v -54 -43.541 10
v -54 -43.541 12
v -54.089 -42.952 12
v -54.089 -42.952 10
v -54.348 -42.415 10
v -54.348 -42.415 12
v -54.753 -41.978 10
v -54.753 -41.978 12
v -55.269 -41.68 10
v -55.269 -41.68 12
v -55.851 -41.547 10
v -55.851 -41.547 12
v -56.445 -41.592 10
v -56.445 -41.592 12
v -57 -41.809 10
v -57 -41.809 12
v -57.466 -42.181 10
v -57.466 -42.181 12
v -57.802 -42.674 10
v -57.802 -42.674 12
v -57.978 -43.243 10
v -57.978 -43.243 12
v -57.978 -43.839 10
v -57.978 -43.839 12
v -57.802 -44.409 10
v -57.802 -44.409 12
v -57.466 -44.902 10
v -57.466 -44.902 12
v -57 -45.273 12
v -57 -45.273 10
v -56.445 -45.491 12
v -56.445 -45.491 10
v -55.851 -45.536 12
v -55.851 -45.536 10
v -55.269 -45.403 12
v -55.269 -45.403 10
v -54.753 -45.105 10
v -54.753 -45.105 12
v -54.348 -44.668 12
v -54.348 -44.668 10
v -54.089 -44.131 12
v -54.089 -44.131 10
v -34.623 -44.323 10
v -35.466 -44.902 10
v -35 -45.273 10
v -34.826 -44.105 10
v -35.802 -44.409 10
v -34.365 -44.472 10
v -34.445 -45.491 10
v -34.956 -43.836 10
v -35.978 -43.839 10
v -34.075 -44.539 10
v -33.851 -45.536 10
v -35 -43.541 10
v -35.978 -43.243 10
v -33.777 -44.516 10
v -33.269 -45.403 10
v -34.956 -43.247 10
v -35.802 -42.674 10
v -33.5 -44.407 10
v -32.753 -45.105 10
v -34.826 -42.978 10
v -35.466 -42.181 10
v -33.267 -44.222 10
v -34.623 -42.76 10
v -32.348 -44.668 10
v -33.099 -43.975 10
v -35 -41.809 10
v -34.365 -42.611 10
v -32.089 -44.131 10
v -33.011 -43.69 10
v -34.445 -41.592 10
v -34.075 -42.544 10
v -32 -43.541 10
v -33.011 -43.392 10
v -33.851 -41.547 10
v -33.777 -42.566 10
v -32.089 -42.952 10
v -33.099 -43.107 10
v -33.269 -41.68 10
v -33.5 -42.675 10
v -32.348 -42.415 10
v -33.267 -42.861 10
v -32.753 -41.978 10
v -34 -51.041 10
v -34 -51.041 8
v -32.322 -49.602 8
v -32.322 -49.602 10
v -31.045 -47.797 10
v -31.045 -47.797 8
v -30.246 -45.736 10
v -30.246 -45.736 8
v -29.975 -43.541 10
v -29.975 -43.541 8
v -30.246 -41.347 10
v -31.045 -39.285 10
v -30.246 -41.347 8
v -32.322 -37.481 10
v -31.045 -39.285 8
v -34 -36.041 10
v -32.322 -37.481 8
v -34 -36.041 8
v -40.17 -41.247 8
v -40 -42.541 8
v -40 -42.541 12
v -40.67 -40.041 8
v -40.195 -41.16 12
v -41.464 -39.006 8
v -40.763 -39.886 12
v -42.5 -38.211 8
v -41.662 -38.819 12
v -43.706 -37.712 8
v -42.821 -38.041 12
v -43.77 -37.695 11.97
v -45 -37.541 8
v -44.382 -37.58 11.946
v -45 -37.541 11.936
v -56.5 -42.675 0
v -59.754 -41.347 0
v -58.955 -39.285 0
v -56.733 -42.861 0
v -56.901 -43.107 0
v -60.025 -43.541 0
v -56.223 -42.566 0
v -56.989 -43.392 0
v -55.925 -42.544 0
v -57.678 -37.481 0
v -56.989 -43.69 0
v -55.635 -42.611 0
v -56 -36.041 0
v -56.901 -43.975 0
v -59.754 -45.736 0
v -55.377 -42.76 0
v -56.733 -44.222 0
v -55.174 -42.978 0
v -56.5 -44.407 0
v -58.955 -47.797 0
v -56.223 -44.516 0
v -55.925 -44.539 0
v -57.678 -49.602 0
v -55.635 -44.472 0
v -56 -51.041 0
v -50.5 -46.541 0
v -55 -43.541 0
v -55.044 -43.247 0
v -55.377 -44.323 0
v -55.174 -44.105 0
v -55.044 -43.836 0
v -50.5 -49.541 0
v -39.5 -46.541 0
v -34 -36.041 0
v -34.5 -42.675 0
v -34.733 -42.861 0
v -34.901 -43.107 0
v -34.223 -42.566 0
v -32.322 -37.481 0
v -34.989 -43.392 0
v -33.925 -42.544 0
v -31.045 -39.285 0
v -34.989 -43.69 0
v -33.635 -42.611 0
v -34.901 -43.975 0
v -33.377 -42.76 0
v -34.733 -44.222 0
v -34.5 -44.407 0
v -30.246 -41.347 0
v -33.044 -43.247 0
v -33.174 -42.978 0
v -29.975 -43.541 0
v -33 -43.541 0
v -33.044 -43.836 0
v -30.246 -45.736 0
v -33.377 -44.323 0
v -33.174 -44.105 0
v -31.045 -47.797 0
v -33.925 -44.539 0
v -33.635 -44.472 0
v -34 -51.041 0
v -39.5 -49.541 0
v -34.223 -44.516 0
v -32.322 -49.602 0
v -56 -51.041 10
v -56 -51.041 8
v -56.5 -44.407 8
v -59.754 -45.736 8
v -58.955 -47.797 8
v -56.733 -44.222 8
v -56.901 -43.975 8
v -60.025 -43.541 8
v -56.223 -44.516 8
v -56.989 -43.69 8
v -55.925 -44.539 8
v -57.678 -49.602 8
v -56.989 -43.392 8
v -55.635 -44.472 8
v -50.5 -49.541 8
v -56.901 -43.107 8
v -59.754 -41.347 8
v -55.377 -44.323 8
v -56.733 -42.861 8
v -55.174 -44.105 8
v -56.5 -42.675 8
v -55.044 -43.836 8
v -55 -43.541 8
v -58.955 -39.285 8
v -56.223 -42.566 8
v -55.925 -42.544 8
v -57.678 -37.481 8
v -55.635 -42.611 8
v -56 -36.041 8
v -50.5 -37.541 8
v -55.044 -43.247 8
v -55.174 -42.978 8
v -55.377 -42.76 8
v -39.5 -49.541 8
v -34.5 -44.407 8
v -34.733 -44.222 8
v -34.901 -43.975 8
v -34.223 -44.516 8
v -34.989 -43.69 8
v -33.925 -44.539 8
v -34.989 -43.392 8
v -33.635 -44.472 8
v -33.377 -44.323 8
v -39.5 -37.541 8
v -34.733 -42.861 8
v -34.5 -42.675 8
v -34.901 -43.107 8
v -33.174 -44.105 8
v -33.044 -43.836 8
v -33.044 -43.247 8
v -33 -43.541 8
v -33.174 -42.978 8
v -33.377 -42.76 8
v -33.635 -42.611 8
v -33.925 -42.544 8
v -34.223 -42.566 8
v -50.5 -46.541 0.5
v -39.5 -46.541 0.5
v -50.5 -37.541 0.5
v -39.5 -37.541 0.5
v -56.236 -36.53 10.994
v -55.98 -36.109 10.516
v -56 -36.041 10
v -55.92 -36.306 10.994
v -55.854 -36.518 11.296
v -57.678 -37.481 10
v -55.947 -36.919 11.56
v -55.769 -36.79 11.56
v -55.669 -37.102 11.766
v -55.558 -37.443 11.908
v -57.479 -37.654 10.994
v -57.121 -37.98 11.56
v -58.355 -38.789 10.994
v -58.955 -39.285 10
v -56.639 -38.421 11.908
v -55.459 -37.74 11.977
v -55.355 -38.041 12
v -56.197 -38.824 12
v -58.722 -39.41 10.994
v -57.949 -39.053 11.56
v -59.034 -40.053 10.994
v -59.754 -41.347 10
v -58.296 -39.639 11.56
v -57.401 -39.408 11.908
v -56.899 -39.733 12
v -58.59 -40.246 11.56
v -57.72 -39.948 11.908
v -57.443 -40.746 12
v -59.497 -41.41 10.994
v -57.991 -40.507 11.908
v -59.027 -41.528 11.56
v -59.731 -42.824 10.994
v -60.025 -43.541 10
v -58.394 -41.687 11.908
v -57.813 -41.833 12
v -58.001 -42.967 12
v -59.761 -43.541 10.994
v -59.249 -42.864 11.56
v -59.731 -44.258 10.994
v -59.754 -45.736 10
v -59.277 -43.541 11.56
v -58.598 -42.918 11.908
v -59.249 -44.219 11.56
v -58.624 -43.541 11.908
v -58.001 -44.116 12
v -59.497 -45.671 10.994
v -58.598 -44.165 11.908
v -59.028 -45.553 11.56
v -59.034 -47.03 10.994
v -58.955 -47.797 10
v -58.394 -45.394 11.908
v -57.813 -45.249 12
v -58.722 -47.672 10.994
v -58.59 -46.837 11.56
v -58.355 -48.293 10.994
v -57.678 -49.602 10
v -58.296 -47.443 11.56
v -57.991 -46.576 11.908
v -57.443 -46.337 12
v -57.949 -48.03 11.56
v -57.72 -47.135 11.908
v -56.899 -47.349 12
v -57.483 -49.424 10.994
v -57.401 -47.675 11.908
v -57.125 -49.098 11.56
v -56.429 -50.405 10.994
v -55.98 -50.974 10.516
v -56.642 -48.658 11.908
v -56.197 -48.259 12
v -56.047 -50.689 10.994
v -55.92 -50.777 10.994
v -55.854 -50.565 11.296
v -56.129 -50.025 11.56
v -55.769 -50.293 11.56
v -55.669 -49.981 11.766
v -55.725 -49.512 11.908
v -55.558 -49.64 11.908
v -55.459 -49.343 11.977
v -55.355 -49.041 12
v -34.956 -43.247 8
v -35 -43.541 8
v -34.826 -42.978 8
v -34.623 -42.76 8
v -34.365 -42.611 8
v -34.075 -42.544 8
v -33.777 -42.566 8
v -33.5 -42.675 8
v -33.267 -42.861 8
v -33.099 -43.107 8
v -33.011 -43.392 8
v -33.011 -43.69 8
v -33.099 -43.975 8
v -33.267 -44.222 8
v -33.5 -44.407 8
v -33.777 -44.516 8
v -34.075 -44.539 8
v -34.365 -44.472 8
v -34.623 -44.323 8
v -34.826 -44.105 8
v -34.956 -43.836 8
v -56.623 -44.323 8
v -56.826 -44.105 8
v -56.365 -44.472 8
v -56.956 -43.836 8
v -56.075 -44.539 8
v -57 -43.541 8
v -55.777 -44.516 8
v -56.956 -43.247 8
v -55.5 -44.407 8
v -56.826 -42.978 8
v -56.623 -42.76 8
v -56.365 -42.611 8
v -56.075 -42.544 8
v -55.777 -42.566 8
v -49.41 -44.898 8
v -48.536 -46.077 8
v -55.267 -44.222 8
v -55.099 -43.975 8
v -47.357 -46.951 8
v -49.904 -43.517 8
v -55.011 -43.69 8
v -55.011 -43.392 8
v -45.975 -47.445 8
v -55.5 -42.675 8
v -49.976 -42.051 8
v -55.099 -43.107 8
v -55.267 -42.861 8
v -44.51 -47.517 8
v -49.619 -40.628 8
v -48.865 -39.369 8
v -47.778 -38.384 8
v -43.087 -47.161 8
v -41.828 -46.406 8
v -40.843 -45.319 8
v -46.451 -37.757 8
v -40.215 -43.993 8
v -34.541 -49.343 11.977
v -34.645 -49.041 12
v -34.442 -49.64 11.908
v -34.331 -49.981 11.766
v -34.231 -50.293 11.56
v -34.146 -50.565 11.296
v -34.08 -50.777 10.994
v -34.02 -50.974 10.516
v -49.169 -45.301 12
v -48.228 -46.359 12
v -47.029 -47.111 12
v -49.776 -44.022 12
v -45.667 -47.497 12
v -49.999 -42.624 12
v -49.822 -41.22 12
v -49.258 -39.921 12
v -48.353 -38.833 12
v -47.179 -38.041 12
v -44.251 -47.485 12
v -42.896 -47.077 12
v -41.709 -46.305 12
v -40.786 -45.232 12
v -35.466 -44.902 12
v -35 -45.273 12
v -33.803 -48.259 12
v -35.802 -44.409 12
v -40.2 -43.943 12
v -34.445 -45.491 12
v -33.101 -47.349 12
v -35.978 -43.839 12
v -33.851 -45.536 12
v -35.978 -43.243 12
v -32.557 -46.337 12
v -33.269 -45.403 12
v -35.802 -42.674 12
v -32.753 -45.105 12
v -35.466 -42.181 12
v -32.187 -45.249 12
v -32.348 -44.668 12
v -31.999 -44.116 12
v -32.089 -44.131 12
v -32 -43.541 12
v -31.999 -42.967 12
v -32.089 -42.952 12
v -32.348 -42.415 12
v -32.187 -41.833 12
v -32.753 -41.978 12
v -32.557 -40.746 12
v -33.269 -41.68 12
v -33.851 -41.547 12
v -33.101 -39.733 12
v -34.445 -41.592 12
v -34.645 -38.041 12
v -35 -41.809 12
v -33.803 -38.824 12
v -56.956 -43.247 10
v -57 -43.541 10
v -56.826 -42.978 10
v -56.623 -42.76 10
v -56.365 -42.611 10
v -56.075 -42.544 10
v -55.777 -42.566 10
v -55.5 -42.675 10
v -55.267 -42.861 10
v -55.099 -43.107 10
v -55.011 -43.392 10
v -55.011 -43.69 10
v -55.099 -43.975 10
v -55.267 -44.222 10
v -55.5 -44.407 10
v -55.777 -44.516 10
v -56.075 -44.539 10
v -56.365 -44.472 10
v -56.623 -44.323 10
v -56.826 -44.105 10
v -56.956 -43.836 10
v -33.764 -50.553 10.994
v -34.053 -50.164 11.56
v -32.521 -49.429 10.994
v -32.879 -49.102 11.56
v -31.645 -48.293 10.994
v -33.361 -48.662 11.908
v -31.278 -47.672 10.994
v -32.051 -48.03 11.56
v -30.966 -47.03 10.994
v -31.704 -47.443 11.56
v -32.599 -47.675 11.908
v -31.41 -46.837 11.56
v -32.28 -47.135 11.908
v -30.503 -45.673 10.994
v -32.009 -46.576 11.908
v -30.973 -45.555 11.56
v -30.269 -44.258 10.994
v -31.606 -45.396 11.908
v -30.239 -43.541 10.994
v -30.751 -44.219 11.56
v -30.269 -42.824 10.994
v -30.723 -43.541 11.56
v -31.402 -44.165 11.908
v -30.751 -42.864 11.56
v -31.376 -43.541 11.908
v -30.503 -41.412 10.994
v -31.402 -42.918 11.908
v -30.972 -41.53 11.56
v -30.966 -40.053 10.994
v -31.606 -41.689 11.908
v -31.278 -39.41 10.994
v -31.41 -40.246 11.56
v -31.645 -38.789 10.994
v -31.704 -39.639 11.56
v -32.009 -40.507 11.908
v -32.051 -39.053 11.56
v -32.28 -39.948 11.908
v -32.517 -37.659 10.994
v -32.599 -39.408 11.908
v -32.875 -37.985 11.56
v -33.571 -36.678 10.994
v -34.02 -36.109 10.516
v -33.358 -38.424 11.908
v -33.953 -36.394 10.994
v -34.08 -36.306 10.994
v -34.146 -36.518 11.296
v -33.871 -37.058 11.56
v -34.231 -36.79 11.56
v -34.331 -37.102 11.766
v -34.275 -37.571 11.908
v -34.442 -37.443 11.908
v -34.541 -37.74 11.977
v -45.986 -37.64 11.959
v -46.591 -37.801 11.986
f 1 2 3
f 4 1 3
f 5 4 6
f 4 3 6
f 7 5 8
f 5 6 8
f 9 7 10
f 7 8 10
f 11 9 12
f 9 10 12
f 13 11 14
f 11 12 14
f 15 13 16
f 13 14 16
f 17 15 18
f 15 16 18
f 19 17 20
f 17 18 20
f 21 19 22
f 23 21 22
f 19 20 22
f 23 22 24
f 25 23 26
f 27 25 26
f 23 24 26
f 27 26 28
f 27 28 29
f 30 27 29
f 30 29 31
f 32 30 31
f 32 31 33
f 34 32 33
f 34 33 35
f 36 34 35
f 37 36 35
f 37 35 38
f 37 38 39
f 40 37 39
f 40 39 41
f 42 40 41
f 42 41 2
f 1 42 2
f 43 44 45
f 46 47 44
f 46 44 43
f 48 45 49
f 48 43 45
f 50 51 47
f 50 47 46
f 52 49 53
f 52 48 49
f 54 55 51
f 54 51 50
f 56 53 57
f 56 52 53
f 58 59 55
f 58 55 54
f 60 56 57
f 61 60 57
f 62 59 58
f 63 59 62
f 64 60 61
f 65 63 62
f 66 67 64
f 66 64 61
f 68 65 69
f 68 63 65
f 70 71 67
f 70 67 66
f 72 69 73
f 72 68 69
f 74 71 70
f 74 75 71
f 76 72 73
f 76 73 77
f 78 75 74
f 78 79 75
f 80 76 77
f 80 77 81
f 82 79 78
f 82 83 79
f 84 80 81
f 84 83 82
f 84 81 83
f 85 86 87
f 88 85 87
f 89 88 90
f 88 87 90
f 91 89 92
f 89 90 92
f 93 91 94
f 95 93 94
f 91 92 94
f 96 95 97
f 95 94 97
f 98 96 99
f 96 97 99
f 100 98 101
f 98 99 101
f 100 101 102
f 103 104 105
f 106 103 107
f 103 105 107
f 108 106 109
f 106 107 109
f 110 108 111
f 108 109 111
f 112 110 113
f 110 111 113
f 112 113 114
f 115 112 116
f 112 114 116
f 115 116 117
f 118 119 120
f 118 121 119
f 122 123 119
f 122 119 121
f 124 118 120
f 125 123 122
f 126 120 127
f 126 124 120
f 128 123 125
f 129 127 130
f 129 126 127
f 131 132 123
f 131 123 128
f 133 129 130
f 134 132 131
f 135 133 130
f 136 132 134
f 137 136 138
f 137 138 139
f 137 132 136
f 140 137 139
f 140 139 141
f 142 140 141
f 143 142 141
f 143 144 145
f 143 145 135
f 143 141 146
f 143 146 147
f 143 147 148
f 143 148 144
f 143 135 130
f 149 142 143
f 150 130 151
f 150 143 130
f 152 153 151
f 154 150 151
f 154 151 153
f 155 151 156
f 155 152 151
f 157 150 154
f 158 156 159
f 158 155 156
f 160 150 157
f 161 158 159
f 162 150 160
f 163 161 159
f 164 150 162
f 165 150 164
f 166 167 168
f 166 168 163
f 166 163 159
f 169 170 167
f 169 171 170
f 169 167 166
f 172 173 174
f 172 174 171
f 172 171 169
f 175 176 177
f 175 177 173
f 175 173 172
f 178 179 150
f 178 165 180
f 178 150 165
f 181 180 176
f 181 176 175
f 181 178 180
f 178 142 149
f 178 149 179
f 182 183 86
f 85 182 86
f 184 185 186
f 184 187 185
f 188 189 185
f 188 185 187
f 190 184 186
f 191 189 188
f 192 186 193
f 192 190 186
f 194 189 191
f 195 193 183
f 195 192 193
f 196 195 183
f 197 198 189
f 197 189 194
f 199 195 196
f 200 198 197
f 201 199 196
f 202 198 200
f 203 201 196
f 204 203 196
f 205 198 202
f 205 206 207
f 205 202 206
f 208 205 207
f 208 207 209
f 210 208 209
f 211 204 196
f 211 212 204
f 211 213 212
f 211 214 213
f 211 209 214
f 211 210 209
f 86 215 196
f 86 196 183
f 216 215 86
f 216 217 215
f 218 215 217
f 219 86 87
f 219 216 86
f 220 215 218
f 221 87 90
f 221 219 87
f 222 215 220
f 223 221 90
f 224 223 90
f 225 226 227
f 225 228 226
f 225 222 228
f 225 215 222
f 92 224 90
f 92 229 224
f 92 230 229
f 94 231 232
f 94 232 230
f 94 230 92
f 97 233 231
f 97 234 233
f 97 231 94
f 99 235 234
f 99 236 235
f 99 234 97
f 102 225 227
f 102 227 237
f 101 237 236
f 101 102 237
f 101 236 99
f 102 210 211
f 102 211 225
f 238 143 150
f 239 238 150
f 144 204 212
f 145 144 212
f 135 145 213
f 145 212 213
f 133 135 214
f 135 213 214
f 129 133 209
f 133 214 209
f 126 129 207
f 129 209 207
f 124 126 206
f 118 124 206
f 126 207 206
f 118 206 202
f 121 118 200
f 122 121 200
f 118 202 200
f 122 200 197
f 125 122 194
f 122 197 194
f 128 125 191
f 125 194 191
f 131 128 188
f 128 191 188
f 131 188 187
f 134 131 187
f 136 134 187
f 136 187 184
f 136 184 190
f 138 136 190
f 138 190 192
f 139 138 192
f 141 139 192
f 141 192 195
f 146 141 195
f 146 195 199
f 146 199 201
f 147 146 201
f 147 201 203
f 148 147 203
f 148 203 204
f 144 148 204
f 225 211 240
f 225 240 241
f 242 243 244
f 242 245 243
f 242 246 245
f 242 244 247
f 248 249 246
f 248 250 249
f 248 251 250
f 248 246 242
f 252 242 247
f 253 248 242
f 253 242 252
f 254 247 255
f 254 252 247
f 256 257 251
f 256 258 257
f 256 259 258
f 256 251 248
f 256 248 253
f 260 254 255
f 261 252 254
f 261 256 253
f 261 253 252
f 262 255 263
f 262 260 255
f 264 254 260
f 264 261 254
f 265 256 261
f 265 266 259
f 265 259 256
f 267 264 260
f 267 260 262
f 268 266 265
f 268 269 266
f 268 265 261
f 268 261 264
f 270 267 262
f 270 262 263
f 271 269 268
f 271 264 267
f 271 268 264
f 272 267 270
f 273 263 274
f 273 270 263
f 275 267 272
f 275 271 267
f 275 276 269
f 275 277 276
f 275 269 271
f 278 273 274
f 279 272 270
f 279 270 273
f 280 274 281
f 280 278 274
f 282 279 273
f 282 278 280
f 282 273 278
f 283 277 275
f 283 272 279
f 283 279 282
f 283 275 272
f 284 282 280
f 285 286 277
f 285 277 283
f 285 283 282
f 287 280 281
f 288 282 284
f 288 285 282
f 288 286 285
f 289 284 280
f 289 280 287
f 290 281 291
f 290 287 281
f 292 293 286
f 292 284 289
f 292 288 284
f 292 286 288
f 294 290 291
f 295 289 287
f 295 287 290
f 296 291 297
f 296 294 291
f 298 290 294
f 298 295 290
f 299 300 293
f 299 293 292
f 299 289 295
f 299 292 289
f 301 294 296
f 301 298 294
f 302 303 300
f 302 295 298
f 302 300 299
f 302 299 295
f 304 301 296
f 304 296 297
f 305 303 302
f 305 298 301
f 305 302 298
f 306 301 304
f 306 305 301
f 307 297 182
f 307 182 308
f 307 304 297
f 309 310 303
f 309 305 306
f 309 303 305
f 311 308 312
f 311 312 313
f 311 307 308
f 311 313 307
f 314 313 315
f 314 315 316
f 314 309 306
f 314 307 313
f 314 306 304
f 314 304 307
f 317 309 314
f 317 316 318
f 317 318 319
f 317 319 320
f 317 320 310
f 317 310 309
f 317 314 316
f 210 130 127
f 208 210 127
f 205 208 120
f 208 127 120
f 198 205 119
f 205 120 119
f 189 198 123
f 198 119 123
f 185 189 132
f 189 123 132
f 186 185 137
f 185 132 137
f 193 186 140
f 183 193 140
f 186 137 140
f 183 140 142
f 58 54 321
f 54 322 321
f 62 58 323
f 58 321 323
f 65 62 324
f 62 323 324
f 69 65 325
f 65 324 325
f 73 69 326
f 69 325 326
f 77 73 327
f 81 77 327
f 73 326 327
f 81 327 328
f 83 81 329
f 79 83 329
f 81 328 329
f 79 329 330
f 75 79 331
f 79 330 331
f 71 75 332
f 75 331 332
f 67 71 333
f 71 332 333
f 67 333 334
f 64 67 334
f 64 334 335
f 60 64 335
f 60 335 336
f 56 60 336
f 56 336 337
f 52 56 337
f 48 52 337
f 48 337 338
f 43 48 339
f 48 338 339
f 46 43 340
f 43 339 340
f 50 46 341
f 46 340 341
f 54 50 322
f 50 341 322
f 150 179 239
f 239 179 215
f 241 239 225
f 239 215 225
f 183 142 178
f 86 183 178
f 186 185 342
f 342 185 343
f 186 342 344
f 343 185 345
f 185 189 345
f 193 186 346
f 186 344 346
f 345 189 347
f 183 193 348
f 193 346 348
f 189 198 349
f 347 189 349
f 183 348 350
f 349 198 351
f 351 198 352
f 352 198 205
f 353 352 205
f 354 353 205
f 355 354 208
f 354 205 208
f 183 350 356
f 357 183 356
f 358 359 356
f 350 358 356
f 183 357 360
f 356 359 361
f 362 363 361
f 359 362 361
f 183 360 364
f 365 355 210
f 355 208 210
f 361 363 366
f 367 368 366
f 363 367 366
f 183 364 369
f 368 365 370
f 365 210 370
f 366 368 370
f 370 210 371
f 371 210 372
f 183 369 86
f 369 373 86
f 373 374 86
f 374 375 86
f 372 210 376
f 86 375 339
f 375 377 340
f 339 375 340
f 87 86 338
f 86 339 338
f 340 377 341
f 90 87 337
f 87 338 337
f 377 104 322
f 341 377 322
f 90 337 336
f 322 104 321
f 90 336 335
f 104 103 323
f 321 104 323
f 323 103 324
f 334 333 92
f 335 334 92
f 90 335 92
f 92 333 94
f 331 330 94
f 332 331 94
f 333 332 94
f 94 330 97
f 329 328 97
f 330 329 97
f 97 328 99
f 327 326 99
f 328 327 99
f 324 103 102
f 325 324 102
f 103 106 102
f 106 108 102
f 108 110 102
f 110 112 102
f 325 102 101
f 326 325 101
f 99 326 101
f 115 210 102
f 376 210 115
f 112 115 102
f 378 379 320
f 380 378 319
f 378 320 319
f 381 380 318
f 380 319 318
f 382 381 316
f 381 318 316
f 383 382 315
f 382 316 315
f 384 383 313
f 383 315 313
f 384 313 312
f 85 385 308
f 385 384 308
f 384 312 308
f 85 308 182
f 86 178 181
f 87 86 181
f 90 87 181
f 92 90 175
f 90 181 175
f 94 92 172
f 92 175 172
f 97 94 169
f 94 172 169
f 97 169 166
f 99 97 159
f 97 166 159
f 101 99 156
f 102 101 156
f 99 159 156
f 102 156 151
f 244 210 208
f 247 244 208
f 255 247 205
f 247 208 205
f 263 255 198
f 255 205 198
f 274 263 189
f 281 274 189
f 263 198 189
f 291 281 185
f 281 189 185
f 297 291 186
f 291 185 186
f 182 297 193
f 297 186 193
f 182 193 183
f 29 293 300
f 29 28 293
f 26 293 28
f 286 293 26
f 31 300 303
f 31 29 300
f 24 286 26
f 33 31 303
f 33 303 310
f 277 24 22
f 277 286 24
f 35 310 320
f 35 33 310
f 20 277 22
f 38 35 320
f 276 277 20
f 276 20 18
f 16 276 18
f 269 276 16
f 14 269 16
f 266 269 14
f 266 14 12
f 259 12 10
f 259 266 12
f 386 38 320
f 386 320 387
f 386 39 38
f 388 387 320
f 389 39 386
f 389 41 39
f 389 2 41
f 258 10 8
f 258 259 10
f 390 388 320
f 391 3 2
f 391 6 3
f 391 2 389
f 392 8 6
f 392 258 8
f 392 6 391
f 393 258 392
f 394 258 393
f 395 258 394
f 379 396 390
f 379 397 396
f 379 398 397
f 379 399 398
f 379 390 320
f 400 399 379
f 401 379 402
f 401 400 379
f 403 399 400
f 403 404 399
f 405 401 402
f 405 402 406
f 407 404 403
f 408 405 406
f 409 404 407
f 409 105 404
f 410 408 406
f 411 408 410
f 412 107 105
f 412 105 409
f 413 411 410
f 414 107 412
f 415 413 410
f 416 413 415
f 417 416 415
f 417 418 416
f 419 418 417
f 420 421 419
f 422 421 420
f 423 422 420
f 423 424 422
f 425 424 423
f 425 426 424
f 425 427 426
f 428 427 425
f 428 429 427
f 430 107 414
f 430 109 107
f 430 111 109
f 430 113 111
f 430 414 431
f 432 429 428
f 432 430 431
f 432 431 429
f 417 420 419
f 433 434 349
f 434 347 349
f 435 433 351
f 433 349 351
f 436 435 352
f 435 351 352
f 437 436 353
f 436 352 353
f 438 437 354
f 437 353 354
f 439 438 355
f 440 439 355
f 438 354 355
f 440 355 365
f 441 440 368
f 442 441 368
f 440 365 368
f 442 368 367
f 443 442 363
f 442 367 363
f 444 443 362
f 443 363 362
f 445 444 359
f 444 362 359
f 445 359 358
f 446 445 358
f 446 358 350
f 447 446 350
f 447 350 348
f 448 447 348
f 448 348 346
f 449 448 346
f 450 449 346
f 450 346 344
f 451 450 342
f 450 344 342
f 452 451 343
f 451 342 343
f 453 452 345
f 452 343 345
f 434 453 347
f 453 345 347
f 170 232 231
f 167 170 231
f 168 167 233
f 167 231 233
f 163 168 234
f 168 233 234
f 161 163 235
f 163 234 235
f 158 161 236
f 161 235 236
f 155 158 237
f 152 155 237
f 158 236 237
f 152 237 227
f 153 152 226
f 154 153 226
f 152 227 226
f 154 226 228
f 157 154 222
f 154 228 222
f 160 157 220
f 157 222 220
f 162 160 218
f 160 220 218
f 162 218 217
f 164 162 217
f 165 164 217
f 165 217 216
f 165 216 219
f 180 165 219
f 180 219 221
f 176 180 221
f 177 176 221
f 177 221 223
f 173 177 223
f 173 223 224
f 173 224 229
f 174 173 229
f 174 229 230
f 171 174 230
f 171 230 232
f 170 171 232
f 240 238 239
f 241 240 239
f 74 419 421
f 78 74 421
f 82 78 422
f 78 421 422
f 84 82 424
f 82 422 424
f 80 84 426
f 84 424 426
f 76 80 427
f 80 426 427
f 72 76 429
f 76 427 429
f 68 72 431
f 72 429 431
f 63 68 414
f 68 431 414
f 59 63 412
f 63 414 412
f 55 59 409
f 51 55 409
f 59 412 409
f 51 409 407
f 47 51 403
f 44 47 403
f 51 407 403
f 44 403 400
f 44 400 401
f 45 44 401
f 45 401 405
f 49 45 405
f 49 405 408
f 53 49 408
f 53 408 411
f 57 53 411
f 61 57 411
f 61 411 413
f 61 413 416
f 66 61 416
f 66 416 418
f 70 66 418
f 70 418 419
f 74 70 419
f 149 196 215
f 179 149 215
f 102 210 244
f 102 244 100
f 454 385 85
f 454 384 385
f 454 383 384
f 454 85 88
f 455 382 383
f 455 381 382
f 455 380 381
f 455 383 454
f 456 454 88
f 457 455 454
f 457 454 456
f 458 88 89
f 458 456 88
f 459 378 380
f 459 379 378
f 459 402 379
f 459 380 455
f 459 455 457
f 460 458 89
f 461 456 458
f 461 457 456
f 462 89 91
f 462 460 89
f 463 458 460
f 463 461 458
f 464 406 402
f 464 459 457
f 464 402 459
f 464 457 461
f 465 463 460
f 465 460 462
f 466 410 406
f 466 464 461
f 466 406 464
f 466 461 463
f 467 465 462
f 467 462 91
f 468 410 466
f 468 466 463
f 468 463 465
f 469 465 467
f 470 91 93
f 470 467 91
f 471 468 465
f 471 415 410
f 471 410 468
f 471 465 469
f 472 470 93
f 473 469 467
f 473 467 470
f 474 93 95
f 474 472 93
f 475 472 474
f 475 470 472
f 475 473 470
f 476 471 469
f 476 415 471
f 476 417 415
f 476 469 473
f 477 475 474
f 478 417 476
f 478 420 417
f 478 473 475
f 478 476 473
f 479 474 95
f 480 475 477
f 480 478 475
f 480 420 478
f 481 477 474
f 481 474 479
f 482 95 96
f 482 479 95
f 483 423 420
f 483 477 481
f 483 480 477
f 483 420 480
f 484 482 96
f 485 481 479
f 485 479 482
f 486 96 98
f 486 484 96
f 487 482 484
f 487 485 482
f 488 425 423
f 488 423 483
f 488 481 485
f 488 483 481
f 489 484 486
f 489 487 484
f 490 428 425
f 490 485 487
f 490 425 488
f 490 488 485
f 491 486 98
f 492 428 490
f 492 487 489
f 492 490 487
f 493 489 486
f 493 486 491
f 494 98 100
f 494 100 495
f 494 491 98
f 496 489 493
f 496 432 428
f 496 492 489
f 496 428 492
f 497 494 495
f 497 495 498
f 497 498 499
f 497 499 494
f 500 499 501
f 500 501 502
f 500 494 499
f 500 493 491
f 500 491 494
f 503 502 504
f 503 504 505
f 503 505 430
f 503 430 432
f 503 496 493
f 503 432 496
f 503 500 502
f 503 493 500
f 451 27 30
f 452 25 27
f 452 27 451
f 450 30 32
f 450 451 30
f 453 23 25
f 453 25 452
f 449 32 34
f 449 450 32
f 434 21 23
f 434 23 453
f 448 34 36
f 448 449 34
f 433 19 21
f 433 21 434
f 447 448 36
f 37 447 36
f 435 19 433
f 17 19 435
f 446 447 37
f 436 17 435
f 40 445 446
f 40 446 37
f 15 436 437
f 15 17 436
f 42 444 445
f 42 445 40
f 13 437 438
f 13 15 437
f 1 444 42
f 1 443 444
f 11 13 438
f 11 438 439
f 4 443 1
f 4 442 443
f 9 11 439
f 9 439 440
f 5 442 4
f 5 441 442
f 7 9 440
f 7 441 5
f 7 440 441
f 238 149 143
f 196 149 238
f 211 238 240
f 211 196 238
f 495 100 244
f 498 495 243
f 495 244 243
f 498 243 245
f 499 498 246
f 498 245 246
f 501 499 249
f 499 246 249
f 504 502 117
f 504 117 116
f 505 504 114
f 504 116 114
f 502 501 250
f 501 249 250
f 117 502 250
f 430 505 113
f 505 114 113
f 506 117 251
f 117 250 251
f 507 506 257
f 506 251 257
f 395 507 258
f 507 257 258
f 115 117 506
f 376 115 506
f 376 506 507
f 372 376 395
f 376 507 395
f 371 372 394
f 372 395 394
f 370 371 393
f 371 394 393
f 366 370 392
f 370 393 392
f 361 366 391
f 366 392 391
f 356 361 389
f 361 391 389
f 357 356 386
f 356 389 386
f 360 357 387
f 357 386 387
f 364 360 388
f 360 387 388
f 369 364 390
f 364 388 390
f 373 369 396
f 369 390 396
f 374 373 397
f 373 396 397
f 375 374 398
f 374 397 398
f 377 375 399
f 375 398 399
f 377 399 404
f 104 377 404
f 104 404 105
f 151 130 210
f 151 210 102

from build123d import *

# Parameters (mm, degrees)
F0_W            = 22
F0_H            = 15
F1_DEPTH        = 8
F2_R            = 1
F2_W            = 11
F2_H            = 12
F3_DEPTH        = 9
F4_W            = 11
F4_H            = 9
F5_DEPTH        = 0.5
F6_W            = 22
F6_H            = 15
F7_DEPTH        = 4
F9_DEPTH        = 4
F10_T1_DEPTH    = 32
F10_T4_ANGLE    = 176.5875970816
F10_T6_ANGLE    = 176.5875970816
F11_D           = 2
F11_DEPTH       = 20
F11_CBORE_D     = 4
F11_CBORE_DEPTH = 2
F11_TIP         = 0.600860619


# Not quite as in the source:
# - a fillet or chamfer that OpenCascade refuses, or shapes differently, is made with other operations: its cross-section is extruded or revolved along the edge and cut away or added


with BuildPart() as f1:
    # F0 (on Top) → F1 (new body)
    with BuildSketch(Plane.XY):
        with Locations((-45, -43.5413755476)):
            Rectangle(F0_W, F0_H)
        with BuildLine():
            ThreePointArc((-34, -51.0413755476), (-29.9749371855, -43.5413755476), (-34, -36.0413755476))
            Line((-34, -36.0413755476), (-34, -51.0413755476))
        make_face()
        with BuildLine():
            Line((-56, -51.0413755476), (-56, -36.0413755476))
            ThreePointArc((-56, -36.0413755476), (-60.0250628145, -43.5413755476), (-56, -51.0413755476))
        make_face()
    extrude(amount=F1_DEPTH)

    # F2 (on face) → F3 (cut)
    with BuildSketch(Plane.XY.offset(8)):
        with Locations((-56, -43.5413755476)):
            Circle(F2_R)
        with Locations((-34, -43.5413755476)):
            Circle(F2_R)
        with Locations((-45, -43.5413755476)):
            Rectangle(F2_W, F2_H)
    extrude(amount=-F3_DEPTH, mode=Mode.SUBTRACT)

    # F4 (on face) → F5 (join)
    with BuildSketch(Plane(origin=(0, 0, 0), x_dir=(1, 0, 0), z_dir=(0, 0, -1))):
        with Locations((-45, 42.0413755476)):
            Rectangle(F4_W, F4_H)
    extrude(amount=-F5_DEPTH)


with BuildPart() as f7:
    # F6 (on face) → F7 (new body)
    with BuildSketch(Plane.XY.offset(8)):
        with Locations((-45, -43.5413755476)):
            Rectangle(F6_W, F6_H)
        with BuildLine():
            ThreePointArc((-34, -51.0413755476), (-29.9749371855, -43.5413755476), (-34, -36.0413755476))
            Line((-34, -36.0413755476), (-34, -51.0413755476))
        make_face()
        with BuildLine():
            Line((-56, -51.0413755476), (-56, -36.0413755476))
            ThreePointArc((-56, -36.0413755476), (-60.0250628145, -43.5413755476), (-56, -51.0413755476))
        make_face()
    extrude(amount=F7_DEPTH)

    # F8 (on face) → F9 (cut)
    with BuildSketch(Plane.XY.offset(12)):
        with BuildLine():
            ThreePointArc((-45, -37.5413755476), (-48.5355339059, -46.0769094536), (-40, -42.5413755476))
            ThreePointArc((-40, -42.5413755476), (-41.4644660941, -39.0058416417), (-45, -37.5413755476))
        make_face()
    extrude(amount=-F9_DEPTH, mode=Mode.SUBTRACT)

    # F10: fillet of radius 2 on 4 edges, made by hand

    # F10_s2 → F10_t1 (cut)
    with BuildSketch(Plane.YZ.offset(-61)):
        with BuildLine():
            ThreePointArc((-36.0413755476, 10), (-36.6271619853, 11.4142135624), (-38.0413755476, 12))
            Line((-38.0413755476, 12), (-36.0413755476, 12))
            Line((-36.0413755476, 12), (-36.0413755476, 10))
        make_face()
        with BuildLine():
            ThreePointArc((-49.0413755476, 12), (-50.45558911, 11.4142135624), (-51.0413755476, 10))
            Line((-51.0413755476, 10), (-51.0413755476, 12))
            Line((-51.0413755476, 12), (-49.0413755476, 12))
        make_face()
    extrude(amount=F10_T1_DEPTH, mode=Mode.SUBTRACT)

    # F10_s3 → F10_t4 (revolve, cut)
    with BuildSketch(Plane(origin=(-40.2362302043, -1.1985422881, 0), x_dir=(0, 0, 1), z_dir=(-0.9995566433, -0.0297744322, 0))):
        with BuildLine():
            ThreePointArc((10, -51.3616145647), (11.4142135624, -50.7758281271), (12, -49.3616145647))
            Line((12, -49.3616145647), (12, -51.3616145647))
            Line((12, -51.3616145647), (10, -51.3616145647))
        make_face()
    revolve(axis=Axis((-38.9749371855, -43.5413755476, 12), (0, 0, 1)), revolution_arc=F10_T4_ANGLE, mode=Mode.SUBTRACT)

    # F10_s5 → F10_t6 (revolve, cut)
    with BuildSketch(Plane(origin=(-52.2756731943, -1.557168866, 0), x_dir=(0, 0, 1), z_dir=(0.9995566433, 0.0297744322, 0))):
        with BuildLine():
            ThreePointArc((10, 33.0028289167), (11.4142135624, 33.5886153543), (12, 35.0028289167))
            Line((12, 35.0028289167), (12, 33.0028289167))
            Line((12, 33.0028289167), (10, 33.0028289167))
        make_face()
    revolve(axis=Axis((-51.0250628145, -43.5413755476, 12), (0, 0, 1)), revolution_arc=F10_T6_ANGLE, mode=Mode.SUBTRACT)

    # F11
    with Locations(Plane.XY.offset(12)):
        with Locations((-34, -43.5413755476), (-56, -43.5413755476)):
            CounterBoreHole(F11_D / 2, F11_CBORE_D / 2, F11_CBORE_DEPTH, depth=F11_DEPTH)
            with Locations((0, 0, -(F11_DEPTH + F11_TIP / 2))):  # 118° drill point
                Cone(0, F11_D / 2, F11_TIP, mode=Mode.SUBTRACT)


solid = Compound([f1.part, f7.part])
